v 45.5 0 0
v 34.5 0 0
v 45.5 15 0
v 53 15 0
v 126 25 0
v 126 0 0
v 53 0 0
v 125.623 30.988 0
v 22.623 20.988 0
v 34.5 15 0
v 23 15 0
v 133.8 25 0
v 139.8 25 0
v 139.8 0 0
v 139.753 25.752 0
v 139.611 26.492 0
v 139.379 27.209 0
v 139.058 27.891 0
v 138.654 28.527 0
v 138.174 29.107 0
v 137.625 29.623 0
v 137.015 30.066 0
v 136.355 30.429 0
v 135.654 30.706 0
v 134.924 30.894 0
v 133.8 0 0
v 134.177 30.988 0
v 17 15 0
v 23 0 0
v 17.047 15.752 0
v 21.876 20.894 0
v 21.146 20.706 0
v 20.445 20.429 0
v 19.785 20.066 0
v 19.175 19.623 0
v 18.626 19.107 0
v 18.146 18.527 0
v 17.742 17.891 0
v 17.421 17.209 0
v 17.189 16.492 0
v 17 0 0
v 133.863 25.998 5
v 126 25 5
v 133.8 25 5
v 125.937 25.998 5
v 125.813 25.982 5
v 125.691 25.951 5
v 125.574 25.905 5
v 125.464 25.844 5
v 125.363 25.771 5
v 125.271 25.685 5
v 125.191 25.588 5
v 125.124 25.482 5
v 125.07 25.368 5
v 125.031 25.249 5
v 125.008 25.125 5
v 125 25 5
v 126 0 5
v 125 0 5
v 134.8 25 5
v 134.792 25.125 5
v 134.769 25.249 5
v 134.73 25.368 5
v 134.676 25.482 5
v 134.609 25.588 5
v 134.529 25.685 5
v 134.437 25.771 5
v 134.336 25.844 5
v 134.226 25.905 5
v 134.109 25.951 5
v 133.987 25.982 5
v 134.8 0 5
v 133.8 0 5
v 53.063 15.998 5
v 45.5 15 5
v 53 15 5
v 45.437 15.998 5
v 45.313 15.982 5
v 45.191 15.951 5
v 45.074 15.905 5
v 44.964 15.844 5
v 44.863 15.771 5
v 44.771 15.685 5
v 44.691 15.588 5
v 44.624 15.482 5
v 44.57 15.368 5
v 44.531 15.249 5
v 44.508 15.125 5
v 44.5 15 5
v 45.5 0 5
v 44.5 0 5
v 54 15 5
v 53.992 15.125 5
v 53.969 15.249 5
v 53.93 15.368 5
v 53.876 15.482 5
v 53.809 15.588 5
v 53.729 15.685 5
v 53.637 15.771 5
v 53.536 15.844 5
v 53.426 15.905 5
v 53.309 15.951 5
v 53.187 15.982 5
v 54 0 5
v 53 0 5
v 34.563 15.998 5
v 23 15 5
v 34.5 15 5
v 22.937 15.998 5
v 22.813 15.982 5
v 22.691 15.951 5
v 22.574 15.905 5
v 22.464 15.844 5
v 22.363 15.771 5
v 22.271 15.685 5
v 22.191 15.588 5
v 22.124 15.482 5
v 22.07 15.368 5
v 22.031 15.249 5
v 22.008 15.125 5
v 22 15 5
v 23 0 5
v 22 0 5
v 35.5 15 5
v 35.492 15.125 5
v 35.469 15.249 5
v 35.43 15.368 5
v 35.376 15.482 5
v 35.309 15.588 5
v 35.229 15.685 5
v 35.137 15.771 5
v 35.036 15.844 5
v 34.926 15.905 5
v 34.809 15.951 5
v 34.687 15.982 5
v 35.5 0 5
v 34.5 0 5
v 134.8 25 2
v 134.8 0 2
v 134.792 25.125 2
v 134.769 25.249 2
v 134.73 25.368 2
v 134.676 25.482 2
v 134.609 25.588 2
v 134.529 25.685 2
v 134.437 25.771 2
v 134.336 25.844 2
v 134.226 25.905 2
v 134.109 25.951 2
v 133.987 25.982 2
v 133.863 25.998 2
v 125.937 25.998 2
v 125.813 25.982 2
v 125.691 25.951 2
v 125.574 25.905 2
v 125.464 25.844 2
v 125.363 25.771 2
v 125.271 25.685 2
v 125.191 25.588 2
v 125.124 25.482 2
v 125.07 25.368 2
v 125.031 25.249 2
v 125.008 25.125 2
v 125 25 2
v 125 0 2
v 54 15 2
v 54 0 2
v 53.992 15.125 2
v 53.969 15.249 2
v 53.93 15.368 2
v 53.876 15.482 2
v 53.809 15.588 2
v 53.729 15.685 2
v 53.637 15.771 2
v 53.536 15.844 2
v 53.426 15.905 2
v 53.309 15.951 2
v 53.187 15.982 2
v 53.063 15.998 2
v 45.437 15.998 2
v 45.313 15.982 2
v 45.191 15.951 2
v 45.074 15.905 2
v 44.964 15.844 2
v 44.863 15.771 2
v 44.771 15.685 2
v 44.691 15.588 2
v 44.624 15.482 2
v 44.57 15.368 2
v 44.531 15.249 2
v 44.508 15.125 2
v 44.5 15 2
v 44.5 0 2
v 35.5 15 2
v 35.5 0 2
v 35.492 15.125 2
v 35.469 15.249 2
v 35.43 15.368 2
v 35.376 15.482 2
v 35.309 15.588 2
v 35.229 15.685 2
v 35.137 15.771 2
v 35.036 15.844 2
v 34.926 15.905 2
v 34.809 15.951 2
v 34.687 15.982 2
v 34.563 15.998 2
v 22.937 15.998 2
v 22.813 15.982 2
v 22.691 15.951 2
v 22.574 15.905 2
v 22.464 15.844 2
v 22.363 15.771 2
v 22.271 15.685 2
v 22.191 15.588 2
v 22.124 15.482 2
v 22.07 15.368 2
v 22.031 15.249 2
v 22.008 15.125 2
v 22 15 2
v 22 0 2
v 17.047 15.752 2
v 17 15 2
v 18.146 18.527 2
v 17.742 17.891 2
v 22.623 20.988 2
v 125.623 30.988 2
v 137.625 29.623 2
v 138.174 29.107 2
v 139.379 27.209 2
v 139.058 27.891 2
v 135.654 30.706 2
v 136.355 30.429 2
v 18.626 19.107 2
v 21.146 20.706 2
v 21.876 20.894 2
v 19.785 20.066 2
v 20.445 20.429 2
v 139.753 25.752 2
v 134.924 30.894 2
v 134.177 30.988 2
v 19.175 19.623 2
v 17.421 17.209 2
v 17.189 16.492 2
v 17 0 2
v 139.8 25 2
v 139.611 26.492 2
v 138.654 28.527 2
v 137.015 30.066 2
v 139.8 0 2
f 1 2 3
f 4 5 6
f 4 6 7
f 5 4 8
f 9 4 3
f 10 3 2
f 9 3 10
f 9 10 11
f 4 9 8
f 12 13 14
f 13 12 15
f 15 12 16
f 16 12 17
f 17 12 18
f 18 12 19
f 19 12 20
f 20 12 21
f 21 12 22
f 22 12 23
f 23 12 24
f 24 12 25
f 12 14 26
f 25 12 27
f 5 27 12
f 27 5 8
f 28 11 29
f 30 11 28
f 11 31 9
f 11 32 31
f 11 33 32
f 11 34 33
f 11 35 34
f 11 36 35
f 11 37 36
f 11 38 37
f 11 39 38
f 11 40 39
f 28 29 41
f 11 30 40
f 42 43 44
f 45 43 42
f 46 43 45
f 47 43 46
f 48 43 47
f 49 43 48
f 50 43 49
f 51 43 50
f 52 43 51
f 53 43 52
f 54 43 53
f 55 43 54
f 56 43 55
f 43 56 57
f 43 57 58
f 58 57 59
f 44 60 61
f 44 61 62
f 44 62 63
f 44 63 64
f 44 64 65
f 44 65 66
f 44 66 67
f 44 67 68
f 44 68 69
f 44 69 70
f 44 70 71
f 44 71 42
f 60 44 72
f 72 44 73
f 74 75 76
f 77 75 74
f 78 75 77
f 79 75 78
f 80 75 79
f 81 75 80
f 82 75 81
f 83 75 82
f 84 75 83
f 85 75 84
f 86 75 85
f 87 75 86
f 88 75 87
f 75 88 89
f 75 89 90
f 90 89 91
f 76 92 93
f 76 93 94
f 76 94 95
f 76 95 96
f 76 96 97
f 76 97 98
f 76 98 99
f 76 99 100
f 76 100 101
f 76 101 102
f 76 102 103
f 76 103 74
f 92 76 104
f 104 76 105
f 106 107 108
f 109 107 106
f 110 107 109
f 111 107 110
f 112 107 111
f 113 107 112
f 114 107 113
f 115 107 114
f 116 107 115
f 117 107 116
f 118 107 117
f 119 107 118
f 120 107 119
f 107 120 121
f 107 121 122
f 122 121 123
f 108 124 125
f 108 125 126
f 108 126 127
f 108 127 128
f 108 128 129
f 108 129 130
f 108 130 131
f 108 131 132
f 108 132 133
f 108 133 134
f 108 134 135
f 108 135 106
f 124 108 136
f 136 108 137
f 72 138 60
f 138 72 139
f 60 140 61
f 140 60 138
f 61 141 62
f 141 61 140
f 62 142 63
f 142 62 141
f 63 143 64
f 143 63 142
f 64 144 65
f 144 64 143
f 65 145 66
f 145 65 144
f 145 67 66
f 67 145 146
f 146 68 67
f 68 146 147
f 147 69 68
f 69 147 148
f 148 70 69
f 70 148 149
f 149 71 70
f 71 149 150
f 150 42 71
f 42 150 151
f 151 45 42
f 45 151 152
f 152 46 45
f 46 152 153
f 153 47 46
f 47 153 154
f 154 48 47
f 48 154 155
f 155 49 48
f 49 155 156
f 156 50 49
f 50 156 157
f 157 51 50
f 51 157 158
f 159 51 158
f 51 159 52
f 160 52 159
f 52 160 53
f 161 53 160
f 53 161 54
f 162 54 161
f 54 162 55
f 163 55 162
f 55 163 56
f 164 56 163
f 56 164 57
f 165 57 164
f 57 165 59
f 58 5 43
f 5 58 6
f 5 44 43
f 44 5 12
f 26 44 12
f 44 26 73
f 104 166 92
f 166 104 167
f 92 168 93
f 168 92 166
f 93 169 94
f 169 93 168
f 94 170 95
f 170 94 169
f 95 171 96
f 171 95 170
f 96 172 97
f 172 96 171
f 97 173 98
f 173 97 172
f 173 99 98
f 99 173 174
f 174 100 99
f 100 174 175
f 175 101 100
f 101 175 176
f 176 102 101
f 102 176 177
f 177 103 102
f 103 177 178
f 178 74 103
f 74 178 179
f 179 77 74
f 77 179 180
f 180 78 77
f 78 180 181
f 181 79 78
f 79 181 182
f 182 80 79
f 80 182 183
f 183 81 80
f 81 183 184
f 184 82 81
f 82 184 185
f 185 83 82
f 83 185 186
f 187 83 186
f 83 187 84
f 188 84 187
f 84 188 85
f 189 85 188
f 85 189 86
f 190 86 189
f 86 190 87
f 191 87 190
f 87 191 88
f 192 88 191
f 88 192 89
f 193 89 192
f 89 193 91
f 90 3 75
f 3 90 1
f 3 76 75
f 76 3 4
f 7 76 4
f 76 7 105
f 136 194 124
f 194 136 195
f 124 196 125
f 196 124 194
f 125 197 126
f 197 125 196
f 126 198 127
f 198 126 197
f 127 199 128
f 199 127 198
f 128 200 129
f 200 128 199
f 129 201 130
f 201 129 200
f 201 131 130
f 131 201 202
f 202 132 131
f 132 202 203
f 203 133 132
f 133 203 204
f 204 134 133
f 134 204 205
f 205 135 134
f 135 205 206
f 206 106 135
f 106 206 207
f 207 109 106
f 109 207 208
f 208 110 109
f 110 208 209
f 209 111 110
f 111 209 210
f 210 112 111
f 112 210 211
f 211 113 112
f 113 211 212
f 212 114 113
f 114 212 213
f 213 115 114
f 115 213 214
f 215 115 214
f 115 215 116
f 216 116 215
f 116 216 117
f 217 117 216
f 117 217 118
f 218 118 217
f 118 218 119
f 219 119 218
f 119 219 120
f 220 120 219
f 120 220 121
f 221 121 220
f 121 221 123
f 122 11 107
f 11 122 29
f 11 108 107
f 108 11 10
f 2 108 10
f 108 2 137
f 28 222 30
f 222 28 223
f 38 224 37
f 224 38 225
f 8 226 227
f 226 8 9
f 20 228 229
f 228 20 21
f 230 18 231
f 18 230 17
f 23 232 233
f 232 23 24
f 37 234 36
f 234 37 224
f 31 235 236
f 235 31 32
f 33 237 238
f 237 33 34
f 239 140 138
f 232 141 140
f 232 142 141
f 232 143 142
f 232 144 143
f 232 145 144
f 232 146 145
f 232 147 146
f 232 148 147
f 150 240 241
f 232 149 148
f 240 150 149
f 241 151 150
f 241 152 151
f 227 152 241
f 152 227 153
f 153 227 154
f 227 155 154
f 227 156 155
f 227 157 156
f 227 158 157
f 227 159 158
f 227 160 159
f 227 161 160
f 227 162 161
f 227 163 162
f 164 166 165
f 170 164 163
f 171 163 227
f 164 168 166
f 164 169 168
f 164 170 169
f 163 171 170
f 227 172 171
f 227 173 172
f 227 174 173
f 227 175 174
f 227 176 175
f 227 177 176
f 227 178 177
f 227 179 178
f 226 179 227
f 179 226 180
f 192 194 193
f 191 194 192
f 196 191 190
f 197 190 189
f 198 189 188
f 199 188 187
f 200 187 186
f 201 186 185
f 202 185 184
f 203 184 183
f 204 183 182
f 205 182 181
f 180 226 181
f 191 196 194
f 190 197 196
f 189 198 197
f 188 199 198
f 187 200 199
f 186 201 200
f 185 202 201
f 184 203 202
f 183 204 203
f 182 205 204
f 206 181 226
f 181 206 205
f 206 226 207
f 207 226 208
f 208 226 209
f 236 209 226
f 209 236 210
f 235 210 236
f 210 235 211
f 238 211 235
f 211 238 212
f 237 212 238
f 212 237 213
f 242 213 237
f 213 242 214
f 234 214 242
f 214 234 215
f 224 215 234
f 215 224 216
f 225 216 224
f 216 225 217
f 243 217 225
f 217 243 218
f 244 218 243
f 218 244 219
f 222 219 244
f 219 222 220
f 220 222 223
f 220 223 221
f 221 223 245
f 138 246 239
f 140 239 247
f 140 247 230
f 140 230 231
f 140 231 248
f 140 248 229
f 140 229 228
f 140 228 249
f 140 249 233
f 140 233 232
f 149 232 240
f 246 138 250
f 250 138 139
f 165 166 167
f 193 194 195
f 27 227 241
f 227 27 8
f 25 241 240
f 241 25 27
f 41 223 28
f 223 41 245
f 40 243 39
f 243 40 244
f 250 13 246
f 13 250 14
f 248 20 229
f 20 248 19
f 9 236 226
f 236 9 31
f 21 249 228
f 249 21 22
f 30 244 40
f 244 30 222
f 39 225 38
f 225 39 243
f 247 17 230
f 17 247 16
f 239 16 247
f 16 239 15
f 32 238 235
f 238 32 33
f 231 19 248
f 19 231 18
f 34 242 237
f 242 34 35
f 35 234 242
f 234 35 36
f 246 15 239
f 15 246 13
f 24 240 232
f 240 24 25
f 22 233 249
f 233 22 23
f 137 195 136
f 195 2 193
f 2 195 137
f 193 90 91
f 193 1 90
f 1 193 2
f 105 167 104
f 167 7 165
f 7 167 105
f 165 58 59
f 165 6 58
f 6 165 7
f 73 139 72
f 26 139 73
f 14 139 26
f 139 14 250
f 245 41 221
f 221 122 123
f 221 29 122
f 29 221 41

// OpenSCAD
$fn=50;
largeur=45;
longueur=150;

epaisseur_plaque = 2;
epaisseur_attache= 5;


module plaque() {
    difference() {
        square([longueur, largeur]);
        trou1();
        trou2();
    }
}
module trou1() {
    translate([23,0]) difference() {
        square([30,15]);
        translate([11.5,0]) square([11,15]);
    }
}
module trou2() {
    translate([126,0])
        square([7.8,25]);
}


module attaches() {
difference() {
     minkowski(){
        trou1();
        circle();
    }
    trou1();
}
difference() {
    minkowski(){
        trou2();
        circle();
    }
    trou2();
}
}

intersection() {
    union() {
        linear_extrude(height=epaisseur_attache)
            attaches();
        linear_extrude(height=epaisseur_plaque)
            minkowski() {
                hull() attaches();
                circle(d=10);
            }
    }
    linear_extrude(height=epaisseur_attache)
        plaque();
}
